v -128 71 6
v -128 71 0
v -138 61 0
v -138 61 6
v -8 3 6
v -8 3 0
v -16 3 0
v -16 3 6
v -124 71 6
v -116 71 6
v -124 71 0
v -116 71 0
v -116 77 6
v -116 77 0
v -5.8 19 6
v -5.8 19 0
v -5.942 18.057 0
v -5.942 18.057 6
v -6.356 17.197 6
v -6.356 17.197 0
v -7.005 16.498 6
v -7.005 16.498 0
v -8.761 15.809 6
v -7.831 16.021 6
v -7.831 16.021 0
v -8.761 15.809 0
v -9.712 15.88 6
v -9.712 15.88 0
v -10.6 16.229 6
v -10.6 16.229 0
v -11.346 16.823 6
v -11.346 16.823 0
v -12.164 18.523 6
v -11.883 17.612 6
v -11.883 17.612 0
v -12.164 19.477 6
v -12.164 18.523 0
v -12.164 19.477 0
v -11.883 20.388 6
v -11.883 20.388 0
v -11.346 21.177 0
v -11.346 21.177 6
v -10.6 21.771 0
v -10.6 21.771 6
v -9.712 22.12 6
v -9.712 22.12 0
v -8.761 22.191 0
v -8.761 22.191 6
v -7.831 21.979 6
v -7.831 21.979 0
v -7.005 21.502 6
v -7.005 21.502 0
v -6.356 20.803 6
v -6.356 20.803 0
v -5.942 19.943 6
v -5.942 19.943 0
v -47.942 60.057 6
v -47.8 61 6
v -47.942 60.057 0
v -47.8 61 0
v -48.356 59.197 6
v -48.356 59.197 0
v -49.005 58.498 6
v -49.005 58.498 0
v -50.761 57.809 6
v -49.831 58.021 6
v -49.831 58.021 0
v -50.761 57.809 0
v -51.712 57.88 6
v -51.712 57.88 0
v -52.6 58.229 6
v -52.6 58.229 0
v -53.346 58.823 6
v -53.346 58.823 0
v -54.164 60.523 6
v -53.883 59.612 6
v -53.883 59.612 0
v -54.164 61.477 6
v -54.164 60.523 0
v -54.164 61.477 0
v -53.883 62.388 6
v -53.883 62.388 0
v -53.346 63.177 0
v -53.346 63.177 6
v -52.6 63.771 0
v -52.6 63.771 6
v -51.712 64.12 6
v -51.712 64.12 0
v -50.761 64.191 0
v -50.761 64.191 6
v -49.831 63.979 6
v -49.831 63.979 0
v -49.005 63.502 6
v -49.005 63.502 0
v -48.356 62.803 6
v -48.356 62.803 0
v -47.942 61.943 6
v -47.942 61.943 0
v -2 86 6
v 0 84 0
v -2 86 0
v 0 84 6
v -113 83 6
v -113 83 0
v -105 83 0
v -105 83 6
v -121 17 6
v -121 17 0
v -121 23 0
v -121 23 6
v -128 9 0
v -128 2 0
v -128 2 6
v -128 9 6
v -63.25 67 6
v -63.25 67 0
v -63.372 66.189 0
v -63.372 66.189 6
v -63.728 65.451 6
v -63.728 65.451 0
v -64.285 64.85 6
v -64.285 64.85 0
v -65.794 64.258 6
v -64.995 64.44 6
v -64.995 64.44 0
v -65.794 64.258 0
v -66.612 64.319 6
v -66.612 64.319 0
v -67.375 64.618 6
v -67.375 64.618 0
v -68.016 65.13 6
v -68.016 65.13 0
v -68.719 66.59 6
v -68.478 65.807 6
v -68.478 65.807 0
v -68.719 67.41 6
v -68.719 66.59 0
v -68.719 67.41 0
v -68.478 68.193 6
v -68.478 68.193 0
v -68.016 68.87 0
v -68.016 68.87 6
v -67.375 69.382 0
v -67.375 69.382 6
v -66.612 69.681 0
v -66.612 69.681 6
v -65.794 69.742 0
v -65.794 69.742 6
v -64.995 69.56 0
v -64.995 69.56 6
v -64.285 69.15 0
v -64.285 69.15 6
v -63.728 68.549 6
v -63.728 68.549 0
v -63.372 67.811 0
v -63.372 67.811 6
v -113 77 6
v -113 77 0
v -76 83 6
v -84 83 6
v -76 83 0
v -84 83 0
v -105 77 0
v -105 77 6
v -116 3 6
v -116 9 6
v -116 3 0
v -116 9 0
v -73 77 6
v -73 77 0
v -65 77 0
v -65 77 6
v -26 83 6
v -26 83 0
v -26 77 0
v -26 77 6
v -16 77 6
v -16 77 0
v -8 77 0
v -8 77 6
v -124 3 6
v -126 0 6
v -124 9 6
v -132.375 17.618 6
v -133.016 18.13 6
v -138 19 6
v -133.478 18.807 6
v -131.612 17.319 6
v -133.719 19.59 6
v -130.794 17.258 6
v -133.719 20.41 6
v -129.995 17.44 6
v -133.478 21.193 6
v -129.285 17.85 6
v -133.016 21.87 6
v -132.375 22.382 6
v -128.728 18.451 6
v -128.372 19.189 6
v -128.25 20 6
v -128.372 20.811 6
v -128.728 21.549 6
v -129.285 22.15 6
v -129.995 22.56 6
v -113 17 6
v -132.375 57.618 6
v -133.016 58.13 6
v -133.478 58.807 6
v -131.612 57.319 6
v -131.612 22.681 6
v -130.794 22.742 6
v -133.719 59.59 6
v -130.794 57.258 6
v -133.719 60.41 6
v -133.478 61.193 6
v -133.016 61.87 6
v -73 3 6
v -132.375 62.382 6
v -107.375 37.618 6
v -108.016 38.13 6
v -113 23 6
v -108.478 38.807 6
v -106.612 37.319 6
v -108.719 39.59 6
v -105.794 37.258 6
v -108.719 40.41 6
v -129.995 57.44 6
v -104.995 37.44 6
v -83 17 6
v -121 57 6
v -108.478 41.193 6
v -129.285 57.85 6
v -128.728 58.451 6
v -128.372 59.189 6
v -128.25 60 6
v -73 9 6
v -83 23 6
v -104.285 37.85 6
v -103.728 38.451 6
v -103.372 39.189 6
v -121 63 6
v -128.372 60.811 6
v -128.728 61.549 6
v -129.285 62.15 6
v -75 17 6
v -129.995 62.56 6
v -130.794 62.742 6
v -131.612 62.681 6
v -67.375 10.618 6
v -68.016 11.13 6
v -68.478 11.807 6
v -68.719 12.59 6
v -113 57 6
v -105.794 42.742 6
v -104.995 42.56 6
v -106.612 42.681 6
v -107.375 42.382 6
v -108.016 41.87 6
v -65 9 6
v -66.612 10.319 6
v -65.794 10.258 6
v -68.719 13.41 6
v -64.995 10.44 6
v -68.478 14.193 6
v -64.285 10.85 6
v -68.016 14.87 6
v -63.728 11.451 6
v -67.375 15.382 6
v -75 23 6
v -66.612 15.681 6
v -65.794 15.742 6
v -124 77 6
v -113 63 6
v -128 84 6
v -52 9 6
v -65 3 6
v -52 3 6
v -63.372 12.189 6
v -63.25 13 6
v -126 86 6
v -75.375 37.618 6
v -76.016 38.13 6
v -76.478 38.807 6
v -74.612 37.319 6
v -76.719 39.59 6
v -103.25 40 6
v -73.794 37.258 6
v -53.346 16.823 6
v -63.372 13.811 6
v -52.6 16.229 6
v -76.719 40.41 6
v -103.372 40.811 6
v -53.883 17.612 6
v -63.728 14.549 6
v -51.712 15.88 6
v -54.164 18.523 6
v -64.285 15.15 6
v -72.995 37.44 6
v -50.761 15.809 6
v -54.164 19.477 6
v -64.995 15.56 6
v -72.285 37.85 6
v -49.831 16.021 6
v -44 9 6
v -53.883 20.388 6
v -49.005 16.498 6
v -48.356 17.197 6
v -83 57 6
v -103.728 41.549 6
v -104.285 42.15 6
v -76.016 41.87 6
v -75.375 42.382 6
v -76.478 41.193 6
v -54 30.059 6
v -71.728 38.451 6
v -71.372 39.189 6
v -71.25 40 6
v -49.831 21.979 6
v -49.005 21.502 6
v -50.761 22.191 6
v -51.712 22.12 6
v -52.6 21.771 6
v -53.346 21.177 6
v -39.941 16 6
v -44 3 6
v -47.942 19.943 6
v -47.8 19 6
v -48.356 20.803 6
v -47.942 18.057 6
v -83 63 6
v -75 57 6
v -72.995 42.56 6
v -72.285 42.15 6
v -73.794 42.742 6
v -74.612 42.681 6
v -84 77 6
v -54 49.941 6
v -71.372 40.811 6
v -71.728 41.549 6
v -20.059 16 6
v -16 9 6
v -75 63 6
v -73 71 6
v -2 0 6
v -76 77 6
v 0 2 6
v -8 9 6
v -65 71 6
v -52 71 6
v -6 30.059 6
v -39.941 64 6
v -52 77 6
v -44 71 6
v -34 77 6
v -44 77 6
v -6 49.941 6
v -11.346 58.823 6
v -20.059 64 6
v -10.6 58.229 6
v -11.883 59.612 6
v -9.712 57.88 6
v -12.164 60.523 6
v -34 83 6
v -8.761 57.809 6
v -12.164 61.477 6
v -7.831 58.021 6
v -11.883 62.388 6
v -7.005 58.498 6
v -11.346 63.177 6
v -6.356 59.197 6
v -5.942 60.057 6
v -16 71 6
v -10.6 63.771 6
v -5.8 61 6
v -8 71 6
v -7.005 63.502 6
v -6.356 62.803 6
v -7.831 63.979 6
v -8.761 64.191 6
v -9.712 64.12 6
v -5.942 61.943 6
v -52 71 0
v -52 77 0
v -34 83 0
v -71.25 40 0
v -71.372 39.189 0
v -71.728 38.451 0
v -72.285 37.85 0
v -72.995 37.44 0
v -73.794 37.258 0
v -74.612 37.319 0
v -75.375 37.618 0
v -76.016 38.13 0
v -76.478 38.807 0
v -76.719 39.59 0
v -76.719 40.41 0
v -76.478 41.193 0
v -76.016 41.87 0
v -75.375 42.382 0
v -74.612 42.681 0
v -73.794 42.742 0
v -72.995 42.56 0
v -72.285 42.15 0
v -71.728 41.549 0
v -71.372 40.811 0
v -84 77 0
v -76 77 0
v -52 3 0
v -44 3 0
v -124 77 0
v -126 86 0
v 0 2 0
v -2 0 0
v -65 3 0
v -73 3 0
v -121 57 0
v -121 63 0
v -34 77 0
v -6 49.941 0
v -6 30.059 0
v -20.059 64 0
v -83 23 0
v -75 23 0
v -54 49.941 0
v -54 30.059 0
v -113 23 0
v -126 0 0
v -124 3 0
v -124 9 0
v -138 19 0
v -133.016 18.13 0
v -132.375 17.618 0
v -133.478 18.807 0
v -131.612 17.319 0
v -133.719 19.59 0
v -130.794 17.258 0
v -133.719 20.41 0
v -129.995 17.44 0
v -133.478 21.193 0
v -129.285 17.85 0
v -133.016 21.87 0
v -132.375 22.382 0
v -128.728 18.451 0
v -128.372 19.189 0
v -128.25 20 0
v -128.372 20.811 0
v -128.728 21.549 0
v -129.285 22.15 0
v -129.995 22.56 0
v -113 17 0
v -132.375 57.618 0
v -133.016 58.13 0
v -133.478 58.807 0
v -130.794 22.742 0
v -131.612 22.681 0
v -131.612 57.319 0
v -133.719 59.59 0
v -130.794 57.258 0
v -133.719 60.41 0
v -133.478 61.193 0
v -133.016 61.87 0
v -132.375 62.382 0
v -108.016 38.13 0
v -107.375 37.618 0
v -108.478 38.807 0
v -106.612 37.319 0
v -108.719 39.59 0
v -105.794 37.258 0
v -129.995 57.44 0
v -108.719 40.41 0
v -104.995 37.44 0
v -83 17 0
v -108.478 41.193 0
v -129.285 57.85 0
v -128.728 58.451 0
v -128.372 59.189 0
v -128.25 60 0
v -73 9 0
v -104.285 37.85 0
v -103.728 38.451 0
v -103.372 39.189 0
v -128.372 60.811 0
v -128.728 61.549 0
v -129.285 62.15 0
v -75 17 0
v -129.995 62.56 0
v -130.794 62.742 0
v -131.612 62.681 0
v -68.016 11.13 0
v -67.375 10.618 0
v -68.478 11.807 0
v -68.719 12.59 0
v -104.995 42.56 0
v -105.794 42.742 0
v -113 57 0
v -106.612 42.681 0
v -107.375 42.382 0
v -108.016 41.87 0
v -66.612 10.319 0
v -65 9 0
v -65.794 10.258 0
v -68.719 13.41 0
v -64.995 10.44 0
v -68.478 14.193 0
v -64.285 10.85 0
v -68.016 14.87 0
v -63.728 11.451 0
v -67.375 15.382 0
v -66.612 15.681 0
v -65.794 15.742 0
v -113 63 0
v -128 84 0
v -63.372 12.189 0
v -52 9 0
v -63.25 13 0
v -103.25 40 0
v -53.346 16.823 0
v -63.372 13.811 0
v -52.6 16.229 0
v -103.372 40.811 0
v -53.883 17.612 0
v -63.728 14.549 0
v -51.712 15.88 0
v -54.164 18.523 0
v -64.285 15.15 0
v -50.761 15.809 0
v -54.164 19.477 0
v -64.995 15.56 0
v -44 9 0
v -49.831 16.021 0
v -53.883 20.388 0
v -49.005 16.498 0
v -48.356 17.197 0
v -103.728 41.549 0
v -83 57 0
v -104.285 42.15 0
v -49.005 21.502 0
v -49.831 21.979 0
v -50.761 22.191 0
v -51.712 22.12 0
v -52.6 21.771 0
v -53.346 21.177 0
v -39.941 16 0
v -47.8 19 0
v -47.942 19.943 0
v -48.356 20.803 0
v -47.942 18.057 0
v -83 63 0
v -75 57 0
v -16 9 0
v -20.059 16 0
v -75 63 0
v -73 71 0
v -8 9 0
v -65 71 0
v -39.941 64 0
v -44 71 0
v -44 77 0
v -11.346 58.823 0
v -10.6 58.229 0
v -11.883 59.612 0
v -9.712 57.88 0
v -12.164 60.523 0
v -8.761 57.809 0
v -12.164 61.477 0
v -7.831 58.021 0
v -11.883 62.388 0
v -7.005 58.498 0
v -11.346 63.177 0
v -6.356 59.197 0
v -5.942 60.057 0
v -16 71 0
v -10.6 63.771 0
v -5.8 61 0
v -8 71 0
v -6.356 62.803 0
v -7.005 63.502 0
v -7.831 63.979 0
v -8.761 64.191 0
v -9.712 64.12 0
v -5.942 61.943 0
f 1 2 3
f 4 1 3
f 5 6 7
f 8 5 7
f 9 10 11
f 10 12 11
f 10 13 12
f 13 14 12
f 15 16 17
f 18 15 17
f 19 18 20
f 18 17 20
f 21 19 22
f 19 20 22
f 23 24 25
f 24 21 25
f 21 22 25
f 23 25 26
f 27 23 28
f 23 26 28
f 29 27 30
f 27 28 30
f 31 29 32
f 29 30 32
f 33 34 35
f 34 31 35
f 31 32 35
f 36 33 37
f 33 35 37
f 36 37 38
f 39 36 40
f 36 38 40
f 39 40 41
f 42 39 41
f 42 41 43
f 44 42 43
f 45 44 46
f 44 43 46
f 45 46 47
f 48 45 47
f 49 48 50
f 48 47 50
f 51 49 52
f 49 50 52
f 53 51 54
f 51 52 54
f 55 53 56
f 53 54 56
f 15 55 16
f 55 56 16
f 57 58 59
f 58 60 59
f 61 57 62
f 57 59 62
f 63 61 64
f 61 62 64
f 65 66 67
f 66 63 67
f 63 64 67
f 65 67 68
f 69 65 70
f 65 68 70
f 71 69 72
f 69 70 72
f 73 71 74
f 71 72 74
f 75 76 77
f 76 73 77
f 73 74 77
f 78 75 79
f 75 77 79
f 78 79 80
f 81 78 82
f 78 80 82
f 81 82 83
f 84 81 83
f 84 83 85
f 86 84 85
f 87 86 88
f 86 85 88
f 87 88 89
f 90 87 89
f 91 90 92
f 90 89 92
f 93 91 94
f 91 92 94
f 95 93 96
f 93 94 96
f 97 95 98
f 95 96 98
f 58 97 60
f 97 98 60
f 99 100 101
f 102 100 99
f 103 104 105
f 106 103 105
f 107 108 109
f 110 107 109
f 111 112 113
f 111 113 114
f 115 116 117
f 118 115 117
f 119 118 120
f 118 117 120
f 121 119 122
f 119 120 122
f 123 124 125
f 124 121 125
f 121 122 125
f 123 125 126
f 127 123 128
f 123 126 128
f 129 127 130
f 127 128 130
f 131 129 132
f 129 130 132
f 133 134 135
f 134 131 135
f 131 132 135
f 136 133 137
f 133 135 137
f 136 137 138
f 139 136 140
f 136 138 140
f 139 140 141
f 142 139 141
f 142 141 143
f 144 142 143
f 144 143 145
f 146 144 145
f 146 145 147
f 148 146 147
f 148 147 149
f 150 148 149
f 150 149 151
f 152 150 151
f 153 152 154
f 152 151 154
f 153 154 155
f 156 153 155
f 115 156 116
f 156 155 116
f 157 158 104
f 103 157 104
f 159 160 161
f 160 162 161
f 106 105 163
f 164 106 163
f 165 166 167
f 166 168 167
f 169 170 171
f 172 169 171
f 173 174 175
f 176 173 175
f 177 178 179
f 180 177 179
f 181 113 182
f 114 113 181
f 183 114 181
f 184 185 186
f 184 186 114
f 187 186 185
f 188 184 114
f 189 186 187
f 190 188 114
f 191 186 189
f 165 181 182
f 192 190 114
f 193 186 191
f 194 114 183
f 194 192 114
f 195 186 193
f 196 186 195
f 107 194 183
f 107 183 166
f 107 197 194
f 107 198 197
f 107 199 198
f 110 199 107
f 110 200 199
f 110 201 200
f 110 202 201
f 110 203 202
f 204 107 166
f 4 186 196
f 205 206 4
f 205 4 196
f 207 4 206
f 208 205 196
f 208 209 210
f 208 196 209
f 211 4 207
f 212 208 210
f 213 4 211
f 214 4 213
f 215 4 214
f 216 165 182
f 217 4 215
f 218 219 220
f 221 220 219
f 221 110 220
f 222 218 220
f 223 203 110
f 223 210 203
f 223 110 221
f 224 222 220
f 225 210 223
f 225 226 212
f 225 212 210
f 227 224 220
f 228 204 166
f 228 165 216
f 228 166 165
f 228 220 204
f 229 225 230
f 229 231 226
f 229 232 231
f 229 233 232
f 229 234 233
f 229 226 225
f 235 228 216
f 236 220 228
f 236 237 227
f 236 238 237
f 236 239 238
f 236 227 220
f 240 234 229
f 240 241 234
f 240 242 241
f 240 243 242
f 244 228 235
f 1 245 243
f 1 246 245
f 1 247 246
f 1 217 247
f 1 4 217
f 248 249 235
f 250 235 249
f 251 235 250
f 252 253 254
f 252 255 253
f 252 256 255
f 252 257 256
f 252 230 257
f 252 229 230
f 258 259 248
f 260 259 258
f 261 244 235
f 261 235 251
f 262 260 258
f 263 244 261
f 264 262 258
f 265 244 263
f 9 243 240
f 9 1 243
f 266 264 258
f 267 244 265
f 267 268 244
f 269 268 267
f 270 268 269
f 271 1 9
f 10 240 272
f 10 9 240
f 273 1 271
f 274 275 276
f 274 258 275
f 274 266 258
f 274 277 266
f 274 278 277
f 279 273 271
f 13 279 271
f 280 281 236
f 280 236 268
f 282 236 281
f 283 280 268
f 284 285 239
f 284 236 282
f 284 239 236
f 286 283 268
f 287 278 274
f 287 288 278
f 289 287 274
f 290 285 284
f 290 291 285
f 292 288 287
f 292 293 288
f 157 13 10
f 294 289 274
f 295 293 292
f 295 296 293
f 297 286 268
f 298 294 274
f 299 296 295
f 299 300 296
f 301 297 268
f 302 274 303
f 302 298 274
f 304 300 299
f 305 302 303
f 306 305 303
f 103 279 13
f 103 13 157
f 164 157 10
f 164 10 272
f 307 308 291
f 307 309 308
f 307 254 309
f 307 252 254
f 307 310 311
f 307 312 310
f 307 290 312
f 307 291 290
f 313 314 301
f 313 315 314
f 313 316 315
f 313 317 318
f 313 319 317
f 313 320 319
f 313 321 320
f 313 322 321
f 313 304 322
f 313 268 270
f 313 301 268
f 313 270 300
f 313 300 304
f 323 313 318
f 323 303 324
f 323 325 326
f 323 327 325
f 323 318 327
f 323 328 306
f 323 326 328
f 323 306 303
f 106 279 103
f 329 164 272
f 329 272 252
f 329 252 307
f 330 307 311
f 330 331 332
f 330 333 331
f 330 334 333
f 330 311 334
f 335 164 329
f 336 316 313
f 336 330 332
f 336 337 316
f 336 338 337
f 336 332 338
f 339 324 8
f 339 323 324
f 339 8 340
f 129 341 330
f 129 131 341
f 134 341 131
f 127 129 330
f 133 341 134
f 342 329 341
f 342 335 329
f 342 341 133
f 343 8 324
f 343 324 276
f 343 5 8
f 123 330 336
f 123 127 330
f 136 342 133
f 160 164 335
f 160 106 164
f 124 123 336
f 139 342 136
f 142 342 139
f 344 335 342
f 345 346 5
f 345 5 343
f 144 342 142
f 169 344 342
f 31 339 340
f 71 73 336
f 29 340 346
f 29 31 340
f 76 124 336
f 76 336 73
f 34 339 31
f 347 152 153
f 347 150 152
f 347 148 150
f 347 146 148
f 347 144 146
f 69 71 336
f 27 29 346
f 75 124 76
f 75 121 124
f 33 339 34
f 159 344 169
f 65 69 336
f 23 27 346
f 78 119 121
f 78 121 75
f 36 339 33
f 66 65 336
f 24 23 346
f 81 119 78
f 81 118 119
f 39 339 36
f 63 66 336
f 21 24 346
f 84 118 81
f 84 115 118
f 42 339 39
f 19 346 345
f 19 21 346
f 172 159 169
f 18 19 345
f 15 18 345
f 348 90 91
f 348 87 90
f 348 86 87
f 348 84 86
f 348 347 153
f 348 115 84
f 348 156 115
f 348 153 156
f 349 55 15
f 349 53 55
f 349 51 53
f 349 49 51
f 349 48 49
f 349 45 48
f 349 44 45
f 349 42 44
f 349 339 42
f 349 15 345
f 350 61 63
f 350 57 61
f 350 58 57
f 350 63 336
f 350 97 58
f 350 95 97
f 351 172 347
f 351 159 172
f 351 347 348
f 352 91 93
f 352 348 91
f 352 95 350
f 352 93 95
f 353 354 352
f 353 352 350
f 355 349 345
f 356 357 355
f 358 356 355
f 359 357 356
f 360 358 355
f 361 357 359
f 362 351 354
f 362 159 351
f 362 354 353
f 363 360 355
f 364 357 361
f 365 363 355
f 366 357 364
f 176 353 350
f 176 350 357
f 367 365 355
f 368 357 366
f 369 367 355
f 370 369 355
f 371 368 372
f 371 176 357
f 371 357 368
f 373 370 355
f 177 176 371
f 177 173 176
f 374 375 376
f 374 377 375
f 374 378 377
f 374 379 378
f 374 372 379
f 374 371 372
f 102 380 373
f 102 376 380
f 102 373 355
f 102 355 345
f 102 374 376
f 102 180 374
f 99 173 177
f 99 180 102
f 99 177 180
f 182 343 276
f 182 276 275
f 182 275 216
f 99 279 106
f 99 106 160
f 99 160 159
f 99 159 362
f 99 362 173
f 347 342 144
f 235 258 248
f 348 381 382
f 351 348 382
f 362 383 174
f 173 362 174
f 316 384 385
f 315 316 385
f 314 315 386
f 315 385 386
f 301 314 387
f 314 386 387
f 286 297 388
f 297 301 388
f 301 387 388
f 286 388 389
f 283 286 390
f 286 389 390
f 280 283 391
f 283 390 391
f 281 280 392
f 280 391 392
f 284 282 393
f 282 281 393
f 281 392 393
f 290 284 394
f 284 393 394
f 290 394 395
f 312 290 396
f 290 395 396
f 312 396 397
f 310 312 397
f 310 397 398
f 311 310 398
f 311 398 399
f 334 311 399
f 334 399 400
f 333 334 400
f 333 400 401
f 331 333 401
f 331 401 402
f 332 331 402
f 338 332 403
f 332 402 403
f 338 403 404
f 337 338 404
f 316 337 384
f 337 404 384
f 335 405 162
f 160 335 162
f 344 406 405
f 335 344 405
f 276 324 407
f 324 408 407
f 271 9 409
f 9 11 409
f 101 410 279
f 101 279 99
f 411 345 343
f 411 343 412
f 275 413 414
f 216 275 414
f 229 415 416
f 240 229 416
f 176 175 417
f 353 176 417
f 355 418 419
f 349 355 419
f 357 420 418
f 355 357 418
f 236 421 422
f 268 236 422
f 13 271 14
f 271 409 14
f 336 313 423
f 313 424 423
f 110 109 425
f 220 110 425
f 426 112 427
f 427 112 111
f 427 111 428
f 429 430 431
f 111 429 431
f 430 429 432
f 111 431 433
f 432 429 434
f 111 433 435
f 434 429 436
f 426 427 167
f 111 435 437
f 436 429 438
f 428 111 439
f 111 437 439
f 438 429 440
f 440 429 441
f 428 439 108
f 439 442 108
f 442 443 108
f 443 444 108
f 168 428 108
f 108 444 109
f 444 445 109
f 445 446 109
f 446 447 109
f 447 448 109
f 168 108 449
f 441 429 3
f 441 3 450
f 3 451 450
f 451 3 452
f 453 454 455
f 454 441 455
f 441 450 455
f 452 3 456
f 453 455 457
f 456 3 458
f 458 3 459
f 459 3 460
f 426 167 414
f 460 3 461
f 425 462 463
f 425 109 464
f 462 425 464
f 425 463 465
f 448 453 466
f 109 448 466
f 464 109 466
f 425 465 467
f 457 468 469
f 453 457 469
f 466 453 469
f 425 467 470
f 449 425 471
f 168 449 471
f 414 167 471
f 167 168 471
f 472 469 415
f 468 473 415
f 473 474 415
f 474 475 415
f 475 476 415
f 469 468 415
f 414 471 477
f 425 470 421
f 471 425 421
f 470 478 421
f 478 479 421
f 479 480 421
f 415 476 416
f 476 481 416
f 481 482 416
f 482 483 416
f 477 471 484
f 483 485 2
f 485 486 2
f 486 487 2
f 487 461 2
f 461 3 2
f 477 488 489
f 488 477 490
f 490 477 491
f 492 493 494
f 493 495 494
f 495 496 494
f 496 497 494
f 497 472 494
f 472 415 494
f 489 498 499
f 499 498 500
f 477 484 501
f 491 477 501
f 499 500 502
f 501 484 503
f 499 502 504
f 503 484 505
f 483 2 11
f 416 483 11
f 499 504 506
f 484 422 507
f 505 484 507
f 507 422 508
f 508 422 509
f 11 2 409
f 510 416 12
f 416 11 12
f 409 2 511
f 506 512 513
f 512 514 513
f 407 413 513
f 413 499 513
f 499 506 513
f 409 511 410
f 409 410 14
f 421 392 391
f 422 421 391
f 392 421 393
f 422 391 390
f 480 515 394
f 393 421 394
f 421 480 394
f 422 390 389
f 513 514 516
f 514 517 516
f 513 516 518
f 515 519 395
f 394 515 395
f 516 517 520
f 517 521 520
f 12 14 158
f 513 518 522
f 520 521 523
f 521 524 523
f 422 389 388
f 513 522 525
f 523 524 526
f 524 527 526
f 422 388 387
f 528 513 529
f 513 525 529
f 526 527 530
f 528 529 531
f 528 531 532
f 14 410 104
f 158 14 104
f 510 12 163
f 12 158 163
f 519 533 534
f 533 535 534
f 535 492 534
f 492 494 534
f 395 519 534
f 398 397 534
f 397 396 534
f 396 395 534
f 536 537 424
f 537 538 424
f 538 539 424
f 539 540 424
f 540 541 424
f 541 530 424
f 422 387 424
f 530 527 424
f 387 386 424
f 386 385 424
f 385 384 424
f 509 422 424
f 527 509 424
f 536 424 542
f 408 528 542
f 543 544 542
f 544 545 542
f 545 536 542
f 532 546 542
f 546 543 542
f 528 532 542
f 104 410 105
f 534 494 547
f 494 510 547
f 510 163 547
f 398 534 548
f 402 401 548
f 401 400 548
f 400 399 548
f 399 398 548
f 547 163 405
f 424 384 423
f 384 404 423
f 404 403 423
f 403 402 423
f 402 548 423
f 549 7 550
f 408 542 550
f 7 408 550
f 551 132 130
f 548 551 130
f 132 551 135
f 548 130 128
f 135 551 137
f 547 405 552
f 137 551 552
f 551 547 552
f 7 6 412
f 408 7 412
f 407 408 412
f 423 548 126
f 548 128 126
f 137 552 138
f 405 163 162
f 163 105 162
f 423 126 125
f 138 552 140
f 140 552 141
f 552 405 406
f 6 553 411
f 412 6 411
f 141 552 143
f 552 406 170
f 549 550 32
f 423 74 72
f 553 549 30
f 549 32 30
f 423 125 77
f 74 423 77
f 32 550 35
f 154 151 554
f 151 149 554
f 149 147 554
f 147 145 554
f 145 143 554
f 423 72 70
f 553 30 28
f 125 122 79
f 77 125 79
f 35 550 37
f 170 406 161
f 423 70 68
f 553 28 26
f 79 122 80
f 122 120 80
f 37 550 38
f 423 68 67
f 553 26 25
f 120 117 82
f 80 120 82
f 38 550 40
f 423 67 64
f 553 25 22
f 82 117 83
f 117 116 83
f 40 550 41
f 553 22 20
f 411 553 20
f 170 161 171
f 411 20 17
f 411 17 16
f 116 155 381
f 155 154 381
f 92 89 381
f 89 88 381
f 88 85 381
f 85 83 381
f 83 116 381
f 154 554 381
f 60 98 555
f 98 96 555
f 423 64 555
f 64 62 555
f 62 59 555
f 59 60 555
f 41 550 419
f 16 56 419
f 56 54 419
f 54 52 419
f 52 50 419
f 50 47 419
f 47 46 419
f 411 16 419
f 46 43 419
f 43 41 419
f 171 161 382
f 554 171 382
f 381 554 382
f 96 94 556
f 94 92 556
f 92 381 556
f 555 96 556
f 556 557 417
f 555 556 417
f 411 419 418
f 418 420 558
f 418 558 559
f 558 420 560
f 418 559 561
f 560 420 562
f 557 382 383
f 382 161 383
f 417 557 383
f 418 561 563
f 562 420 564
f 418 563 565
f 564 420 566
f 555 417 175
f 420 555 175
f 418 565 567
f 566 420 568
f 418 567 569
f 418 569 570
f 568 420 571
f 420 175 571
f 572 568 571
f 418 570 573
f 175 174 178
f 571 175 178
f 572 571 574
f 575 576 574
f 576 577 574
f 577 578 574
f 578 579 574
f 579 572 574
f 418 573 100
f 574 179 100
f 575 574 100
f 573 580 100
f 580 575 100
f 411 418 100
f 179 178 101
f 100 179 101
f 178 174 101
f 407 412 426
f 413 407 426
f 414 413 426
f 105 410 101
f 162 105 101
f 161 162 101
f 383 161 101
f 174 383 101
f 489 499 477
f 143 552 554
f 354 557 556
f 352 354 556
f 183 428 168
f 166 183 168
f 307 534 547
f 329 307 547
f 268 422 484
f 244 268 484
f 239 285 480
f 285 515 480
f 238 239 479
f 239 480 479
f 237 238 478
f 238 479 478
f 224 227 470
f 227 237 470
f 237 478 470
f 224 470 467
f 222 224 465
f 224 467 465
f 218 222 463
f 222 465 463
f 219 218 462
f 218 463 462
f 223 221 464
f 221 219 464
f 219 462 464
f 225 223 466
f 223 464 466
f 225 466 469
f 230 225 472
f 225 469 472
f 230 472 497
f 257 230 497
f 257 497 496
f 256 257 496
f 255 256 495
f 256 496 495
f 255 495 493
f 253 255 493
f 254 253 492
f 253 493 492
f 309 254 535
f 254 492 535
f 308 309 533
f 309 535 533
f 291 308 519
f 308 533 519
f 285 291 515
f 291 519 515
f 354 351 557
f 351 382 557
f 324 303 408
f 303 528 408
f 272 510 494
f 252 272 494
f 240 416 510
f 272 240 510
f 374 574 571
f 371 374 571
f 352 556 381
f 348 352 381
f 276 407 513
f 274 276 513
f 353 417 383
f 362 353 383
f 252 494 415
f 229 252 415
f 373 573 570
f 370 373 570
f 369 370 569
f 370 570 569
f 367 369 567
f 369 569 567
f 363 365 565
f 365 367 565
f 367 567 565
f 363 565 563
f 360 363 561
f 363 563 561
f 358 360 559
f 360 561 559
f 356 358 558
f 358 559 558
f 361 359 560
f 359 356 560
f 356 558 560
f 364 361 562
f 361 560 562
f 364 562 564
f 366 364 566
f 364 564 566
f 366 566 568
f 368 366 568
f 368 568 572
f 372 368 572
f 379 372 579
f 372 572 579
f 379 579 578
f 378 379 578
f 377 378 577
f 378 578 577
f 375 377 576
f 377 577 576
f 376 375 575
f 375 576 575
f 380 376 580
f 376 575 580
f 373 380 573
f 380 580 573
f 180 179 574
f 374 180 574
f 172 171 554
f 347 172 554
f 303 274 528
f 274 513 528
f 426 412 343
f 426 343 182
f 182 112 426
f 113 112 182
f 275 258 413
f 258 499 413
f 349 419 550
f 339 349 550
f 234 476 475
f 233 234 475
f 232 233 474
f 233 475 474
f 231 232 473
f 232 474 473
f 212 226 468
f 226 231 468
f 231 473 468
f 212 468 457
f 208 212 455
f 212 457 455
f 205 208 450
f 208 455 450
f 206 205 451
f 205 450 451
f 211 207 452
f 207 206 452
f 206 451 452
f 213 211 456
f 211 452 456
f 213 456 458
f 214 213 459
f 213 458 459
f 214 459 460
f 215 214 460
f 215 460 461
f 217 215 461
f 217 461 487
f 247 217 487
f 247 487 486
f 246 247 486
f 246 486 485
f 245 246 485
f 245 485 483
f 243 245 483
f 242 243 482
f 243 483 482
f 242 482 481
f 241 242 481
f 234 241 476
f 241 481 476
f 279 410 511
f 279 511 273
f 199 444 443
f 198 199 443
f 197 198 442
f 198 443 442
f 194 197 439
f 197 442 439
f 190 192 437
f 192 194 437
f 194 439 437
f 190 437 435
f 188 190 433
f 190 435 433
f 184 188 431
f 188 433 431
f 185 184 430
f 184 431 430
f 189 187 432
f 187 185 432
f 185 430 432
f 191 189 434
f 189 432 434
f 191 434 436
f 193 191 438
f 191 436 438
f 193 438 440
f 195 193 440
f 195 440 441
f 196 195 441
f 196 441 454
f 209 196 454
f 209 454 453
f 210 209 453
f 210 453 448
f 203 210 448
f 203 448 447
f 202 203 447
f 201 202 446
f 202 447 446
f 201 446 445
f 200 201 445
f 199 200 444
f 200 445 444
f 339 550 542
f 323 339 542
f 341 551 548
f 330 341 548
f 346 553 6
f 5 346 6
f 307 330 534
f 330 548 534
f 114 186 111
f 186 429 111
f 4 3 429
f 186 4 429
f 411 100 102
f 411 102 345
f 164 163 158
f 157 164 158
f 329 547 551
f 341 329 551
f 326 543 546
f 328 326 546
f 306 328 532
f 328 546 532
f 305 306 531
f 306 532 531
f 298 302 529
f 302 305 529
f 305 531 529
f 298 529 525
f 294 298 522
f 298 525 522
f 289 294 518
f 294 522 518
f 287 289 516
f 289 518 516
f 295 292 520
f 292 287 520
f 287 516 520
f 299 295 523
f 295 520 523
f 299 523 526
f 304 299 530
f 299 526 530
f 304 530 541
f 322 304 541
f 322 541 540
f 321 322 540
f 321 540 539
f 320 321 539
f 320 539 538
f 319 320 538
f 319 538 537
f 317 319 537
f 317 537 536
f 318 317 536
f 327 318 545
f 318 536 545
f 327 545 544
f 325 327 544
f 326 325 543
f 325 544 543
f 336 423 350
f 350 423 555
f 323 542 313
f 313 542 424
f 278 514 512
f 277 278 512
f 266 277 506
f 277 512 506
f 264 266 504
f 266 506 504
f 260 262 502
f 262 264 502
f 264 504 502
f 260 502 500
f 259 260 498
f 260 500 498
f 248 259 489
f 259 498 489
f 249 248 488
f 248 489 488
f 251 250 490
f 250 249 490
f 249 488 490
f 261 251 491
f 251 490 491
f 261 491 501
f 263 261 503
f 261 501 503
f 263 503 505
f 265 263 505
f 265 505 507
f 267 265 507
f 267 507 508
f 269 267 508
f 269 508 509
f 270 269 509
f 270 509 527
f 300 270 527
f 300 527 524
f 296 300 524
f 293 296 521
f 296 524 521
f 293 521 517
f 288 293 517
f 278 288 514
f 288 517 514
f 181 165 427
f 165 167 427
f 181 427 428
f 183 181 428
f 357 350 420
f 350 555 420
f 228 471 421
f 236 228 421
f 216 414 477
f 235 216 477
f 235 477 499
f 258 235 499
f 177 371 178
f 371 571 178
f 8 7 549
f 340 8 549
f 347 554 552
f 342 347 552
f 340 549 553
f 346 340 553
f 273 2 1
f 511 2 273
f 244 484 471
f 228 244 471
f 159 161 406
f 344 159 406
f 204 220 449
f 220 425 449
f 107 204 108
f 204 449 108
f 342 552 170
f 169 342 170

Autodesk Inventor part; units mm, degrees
ref_plane "YZ Plane" through (0, 0, 0) normal (1, 0, 0) x (0, 1, 0)
ref_plane "XZ Plane" through (0, 0, 0) normal (0, 1, 0) x (-1, 0, 0)
ref_plane "XY Plane" through (0, 0, 0) normal (0, 0, 1) x (1, 0, 0)
sketch "Sketch1" plane through (0, 0, 0) normal (0, 0, 1) x (1, 0, 0)
  line L0 (0, 0) -> (-128, 0)
  line L1 (-128, 86) -> (0, 86)
  line L2 (0, 86) -> (0, 0)
  line L3 (-128, 71) -> (-138, 61)
  line L4 (-138, 61) -> (-138, 19)
  line L5 (-138, 19) -> (-128, 9)
  line L6 (-128, 0) -> (-128, 9)
  line L7 (-128, 71) -> (-128, 86)
  line L8 (-52, 9) -> (-44, 9)
  line L9 (-44, 9) -> (-44, 3)
  line L10 (-44, 3) -> (-52, 3)
  line L11 (-52, 3) -> (-52, 9)
  line L12 (-52, 77) -> (-44, 77)
  line L13 (-44, 77) -> (-44, 71)
  line L14 (-44, 71) -> (-52, 71)
  line L15 (-52, 71) -> (-52, 77)
  line L16 (-16, 77) -> (-8, 77)
  line L17 (-8, 77) -> (-8, 71)
  line L18 (-8, 71) -> (-16, 71)
  line L19 (-16, 71) -> (-16, 77)
  line L20 (-16, 9) -> (-8, 9)
  line L21 (-8, 9) -> (-8, 3)
  line L22 (-8, 3) -> (-16, 3)
  line L23 (-16, 3) -> (-16, 9)
  line L24 (-34, 83) -> (-26, 83)
  line L25 (-26, 83) -> (-26, 77)
  line L26 (-26, 77) -> (-34, 77)
  line L27 (-34, 77) -> (-34, 83)
  line L28 (-6, 49.9411) -> (-6, 30.0589)
  line L29 (-6, 30.0589) -> (-20.0589, 16)
  line L30 (-20.0589, 16) -> (-39.9411, 16)
  line L31 (-39.9411, 16) -> (-54, 30.0589)
  line L32 (-54, 30.0589) -> (-54, 49.9411)
  line L33 (-54, 49.9411) -> (-39.9411, 64)
  line L34 (-39.9411, 64) -> (-20.0589, 64)
  line L35 (-20.0589, 64) -> (-6, 49.9411)
  line L36 (-51, 61) -> (-9, 61) construction
  line L37 (-9, 61) -> (-9, 19) construction
  line L38 (-9, 19) -> (-51, 19) construction
  line L39 (-51, 19) -> (-51, 61) construction
  circle A0 centre (-51, 61) radius 3.2
  circle A1 centre (-51, 19) radius 3.2
  circle A2 centre (-9, 19) radius 3.2
  circle A3 centre (-9, 61) radius 3.2
  circle A4 centre (-131, 60) radius 2.75
  circle A5 centre (-131, 20) radius 2.75
  line L40 (-124, 77) -> (-116, 77)
  line L41 (-116, 77) -> (-116, 71)
  line L42 (-116, 71) -> (-124, 71)
  line L43 (-124, 71) -> (-124, 77)
  line L44 (-124, 9) -> (-116, 9)
  line L45 (-116, 9) -> (-116, 3)
  line L46 (-116, 3) -> (-124, 3)
  line L47 (-124, 3) -> (-124, 9)
  line L48 (-121, 63) -> (-113, 63)
  line L49 (-113, 63) -> (-113, 57)
  line L50 (-113, 57) -> (-121, 57)
  line L51 (-121, 57) -> (-121, 63)
  line L52 (-121, 23) -> (-113, 23)
  line L53 (-113, 23) -> (-113, 17)
  line L54 (-113, 17) -> (-121, 17)
  line L55 (-121, 17) -> (-121, 23)
  circle A6 centre (-66, 67) radius 2.75
  circle A7 centre (-66, 13) radius 2.75
  line L56 (-60, 86) -> (-60, 0) construction
  line L57 (-132, 67) -> (-60, 67) construction
  line L58 (-132, 13) -> (-60, 13) construction
  line L59 (-83, 63) -> (-75, 63)
  line L60 (-75, 63) -> (-75, 57)
  line L61 (-75, 57) -> (-83, 57)
  line L62 (-83, 57) -> (-83, 63)
  line L63 (-83, 23) -> (-75, 23)
  line L64 (-75, 23) -> (-75, 17)
  line L65 (-75, 17) -> (-83, 17)
  line L66 (-83, 17) -> (-83, 23)
  line L67 (-73, 77) -> (-65, 77)
  line L68 (-65, 77) -> (-65, 71)
  line L69 (-65, 71) -> (-73, 71)
  line L70 (-73, 71) -> (-73, 77)
  line L71 (-73, 9) -> (-65, 9)
  line L72 (-65, 9) -> (-65, 3)
  line L73 (-65, 3) -> (-73, 3)
  line L74 (-73, 3) -> (-73, 9)
  line L75 (-113, 83) -> (-105, 83)
  line L76 (-105, 83) -> (-105, 77)
  line L77 (-105, 77) -> (-113, 77)
  line L78 (-113, 77) -> (-113, 83)
  line L79 (-84, 83) -> (-76, 83)
  line L80 (-76, 83) -> (-76, 77)
  line L81 (-76, 77) -> (-84, 77)
  line L82 (-84, 77) -> (-84, 83)
  circle A8 centre (-106, 40) radius 2.75
  circle A9 centre (-74, 40) radius 2.75
  point P0 (-30, 40)
  point P1 (-138, 40)
  point P2 (-54, 40)
  point P3 (-51, 40)
  point P4 (-30, 61)
  point P5 (-30, 64)
  dimension "d1" = 45
  dimension "d2" = 10
  dimension "d3" = 6
  dimension "d4" = 6
  dimension "d5" = 3
  dimension "d6" = 8
  dimension "d7" = 8
  dimension "d8" = 6
  dimension "d10" = 3
  dimension "d11" = 48
  dimension "d12" = 8
  dimension "d13" = 6
  dimension "d14" = 42
  dimension "d15" = 42
  dimension "d16" = 6.4
  dimension "d17" = 6.4
  dimension "d18" = 6.4
  dimension "d19" = 6.4
  dimension "d20" = 5.5
  dimension "d21" = 5.5
  dimension "d22" = 7
  dimension "d23" = 11
  dimension "d24" = 11
  dimension "d25" = 6
  dimension "d26" = 8
  dimension "d27" = 6
  dimension "d28" = 6
  dimension "d29" = 8
  dimension "d30" = 6
  dimension "d31" = 8
  dimension "d32" = 8
  dimension "d33" = 5.5
  dimension "d34" = 5.5
  dimension "d35" = 4
  dimension "d36" = 4
  dimension "d37" = 8
  dimension "d38" = 8
  dimension "d39" = 8
  dimension "d40" = 4
  dimension "d41" = 8
  dimension "d42" = 128
  dimension "d43" = 68
  dimension "d44" = 8
  dimension "d45" = 43
  dimension "d47" = 10
  dimension "d48" = 15
  dimension "d49" = 62
  dimension "d50" = 10
  dimension "d52" = 8
  dimension "d53" = 3
  dimension "d54" = 8
  dimension "d55" = 3
  dimension "d56" = 5.5
  dimension "d57" = 5.5
  dimension "d58" = 14
  dimension "d59" = 32
  dimension "d65" = 34
extrude "Extrusion1" add sketch "Sketch1" along normal blind 6
chamfer "Chamfer1" distance 2 angle 45 4 edges at (-128, 0, 3) (-128, 86, 3) (0, 86, 3) (0, 0, 3)
properties part number "x_iddler_bottom"
